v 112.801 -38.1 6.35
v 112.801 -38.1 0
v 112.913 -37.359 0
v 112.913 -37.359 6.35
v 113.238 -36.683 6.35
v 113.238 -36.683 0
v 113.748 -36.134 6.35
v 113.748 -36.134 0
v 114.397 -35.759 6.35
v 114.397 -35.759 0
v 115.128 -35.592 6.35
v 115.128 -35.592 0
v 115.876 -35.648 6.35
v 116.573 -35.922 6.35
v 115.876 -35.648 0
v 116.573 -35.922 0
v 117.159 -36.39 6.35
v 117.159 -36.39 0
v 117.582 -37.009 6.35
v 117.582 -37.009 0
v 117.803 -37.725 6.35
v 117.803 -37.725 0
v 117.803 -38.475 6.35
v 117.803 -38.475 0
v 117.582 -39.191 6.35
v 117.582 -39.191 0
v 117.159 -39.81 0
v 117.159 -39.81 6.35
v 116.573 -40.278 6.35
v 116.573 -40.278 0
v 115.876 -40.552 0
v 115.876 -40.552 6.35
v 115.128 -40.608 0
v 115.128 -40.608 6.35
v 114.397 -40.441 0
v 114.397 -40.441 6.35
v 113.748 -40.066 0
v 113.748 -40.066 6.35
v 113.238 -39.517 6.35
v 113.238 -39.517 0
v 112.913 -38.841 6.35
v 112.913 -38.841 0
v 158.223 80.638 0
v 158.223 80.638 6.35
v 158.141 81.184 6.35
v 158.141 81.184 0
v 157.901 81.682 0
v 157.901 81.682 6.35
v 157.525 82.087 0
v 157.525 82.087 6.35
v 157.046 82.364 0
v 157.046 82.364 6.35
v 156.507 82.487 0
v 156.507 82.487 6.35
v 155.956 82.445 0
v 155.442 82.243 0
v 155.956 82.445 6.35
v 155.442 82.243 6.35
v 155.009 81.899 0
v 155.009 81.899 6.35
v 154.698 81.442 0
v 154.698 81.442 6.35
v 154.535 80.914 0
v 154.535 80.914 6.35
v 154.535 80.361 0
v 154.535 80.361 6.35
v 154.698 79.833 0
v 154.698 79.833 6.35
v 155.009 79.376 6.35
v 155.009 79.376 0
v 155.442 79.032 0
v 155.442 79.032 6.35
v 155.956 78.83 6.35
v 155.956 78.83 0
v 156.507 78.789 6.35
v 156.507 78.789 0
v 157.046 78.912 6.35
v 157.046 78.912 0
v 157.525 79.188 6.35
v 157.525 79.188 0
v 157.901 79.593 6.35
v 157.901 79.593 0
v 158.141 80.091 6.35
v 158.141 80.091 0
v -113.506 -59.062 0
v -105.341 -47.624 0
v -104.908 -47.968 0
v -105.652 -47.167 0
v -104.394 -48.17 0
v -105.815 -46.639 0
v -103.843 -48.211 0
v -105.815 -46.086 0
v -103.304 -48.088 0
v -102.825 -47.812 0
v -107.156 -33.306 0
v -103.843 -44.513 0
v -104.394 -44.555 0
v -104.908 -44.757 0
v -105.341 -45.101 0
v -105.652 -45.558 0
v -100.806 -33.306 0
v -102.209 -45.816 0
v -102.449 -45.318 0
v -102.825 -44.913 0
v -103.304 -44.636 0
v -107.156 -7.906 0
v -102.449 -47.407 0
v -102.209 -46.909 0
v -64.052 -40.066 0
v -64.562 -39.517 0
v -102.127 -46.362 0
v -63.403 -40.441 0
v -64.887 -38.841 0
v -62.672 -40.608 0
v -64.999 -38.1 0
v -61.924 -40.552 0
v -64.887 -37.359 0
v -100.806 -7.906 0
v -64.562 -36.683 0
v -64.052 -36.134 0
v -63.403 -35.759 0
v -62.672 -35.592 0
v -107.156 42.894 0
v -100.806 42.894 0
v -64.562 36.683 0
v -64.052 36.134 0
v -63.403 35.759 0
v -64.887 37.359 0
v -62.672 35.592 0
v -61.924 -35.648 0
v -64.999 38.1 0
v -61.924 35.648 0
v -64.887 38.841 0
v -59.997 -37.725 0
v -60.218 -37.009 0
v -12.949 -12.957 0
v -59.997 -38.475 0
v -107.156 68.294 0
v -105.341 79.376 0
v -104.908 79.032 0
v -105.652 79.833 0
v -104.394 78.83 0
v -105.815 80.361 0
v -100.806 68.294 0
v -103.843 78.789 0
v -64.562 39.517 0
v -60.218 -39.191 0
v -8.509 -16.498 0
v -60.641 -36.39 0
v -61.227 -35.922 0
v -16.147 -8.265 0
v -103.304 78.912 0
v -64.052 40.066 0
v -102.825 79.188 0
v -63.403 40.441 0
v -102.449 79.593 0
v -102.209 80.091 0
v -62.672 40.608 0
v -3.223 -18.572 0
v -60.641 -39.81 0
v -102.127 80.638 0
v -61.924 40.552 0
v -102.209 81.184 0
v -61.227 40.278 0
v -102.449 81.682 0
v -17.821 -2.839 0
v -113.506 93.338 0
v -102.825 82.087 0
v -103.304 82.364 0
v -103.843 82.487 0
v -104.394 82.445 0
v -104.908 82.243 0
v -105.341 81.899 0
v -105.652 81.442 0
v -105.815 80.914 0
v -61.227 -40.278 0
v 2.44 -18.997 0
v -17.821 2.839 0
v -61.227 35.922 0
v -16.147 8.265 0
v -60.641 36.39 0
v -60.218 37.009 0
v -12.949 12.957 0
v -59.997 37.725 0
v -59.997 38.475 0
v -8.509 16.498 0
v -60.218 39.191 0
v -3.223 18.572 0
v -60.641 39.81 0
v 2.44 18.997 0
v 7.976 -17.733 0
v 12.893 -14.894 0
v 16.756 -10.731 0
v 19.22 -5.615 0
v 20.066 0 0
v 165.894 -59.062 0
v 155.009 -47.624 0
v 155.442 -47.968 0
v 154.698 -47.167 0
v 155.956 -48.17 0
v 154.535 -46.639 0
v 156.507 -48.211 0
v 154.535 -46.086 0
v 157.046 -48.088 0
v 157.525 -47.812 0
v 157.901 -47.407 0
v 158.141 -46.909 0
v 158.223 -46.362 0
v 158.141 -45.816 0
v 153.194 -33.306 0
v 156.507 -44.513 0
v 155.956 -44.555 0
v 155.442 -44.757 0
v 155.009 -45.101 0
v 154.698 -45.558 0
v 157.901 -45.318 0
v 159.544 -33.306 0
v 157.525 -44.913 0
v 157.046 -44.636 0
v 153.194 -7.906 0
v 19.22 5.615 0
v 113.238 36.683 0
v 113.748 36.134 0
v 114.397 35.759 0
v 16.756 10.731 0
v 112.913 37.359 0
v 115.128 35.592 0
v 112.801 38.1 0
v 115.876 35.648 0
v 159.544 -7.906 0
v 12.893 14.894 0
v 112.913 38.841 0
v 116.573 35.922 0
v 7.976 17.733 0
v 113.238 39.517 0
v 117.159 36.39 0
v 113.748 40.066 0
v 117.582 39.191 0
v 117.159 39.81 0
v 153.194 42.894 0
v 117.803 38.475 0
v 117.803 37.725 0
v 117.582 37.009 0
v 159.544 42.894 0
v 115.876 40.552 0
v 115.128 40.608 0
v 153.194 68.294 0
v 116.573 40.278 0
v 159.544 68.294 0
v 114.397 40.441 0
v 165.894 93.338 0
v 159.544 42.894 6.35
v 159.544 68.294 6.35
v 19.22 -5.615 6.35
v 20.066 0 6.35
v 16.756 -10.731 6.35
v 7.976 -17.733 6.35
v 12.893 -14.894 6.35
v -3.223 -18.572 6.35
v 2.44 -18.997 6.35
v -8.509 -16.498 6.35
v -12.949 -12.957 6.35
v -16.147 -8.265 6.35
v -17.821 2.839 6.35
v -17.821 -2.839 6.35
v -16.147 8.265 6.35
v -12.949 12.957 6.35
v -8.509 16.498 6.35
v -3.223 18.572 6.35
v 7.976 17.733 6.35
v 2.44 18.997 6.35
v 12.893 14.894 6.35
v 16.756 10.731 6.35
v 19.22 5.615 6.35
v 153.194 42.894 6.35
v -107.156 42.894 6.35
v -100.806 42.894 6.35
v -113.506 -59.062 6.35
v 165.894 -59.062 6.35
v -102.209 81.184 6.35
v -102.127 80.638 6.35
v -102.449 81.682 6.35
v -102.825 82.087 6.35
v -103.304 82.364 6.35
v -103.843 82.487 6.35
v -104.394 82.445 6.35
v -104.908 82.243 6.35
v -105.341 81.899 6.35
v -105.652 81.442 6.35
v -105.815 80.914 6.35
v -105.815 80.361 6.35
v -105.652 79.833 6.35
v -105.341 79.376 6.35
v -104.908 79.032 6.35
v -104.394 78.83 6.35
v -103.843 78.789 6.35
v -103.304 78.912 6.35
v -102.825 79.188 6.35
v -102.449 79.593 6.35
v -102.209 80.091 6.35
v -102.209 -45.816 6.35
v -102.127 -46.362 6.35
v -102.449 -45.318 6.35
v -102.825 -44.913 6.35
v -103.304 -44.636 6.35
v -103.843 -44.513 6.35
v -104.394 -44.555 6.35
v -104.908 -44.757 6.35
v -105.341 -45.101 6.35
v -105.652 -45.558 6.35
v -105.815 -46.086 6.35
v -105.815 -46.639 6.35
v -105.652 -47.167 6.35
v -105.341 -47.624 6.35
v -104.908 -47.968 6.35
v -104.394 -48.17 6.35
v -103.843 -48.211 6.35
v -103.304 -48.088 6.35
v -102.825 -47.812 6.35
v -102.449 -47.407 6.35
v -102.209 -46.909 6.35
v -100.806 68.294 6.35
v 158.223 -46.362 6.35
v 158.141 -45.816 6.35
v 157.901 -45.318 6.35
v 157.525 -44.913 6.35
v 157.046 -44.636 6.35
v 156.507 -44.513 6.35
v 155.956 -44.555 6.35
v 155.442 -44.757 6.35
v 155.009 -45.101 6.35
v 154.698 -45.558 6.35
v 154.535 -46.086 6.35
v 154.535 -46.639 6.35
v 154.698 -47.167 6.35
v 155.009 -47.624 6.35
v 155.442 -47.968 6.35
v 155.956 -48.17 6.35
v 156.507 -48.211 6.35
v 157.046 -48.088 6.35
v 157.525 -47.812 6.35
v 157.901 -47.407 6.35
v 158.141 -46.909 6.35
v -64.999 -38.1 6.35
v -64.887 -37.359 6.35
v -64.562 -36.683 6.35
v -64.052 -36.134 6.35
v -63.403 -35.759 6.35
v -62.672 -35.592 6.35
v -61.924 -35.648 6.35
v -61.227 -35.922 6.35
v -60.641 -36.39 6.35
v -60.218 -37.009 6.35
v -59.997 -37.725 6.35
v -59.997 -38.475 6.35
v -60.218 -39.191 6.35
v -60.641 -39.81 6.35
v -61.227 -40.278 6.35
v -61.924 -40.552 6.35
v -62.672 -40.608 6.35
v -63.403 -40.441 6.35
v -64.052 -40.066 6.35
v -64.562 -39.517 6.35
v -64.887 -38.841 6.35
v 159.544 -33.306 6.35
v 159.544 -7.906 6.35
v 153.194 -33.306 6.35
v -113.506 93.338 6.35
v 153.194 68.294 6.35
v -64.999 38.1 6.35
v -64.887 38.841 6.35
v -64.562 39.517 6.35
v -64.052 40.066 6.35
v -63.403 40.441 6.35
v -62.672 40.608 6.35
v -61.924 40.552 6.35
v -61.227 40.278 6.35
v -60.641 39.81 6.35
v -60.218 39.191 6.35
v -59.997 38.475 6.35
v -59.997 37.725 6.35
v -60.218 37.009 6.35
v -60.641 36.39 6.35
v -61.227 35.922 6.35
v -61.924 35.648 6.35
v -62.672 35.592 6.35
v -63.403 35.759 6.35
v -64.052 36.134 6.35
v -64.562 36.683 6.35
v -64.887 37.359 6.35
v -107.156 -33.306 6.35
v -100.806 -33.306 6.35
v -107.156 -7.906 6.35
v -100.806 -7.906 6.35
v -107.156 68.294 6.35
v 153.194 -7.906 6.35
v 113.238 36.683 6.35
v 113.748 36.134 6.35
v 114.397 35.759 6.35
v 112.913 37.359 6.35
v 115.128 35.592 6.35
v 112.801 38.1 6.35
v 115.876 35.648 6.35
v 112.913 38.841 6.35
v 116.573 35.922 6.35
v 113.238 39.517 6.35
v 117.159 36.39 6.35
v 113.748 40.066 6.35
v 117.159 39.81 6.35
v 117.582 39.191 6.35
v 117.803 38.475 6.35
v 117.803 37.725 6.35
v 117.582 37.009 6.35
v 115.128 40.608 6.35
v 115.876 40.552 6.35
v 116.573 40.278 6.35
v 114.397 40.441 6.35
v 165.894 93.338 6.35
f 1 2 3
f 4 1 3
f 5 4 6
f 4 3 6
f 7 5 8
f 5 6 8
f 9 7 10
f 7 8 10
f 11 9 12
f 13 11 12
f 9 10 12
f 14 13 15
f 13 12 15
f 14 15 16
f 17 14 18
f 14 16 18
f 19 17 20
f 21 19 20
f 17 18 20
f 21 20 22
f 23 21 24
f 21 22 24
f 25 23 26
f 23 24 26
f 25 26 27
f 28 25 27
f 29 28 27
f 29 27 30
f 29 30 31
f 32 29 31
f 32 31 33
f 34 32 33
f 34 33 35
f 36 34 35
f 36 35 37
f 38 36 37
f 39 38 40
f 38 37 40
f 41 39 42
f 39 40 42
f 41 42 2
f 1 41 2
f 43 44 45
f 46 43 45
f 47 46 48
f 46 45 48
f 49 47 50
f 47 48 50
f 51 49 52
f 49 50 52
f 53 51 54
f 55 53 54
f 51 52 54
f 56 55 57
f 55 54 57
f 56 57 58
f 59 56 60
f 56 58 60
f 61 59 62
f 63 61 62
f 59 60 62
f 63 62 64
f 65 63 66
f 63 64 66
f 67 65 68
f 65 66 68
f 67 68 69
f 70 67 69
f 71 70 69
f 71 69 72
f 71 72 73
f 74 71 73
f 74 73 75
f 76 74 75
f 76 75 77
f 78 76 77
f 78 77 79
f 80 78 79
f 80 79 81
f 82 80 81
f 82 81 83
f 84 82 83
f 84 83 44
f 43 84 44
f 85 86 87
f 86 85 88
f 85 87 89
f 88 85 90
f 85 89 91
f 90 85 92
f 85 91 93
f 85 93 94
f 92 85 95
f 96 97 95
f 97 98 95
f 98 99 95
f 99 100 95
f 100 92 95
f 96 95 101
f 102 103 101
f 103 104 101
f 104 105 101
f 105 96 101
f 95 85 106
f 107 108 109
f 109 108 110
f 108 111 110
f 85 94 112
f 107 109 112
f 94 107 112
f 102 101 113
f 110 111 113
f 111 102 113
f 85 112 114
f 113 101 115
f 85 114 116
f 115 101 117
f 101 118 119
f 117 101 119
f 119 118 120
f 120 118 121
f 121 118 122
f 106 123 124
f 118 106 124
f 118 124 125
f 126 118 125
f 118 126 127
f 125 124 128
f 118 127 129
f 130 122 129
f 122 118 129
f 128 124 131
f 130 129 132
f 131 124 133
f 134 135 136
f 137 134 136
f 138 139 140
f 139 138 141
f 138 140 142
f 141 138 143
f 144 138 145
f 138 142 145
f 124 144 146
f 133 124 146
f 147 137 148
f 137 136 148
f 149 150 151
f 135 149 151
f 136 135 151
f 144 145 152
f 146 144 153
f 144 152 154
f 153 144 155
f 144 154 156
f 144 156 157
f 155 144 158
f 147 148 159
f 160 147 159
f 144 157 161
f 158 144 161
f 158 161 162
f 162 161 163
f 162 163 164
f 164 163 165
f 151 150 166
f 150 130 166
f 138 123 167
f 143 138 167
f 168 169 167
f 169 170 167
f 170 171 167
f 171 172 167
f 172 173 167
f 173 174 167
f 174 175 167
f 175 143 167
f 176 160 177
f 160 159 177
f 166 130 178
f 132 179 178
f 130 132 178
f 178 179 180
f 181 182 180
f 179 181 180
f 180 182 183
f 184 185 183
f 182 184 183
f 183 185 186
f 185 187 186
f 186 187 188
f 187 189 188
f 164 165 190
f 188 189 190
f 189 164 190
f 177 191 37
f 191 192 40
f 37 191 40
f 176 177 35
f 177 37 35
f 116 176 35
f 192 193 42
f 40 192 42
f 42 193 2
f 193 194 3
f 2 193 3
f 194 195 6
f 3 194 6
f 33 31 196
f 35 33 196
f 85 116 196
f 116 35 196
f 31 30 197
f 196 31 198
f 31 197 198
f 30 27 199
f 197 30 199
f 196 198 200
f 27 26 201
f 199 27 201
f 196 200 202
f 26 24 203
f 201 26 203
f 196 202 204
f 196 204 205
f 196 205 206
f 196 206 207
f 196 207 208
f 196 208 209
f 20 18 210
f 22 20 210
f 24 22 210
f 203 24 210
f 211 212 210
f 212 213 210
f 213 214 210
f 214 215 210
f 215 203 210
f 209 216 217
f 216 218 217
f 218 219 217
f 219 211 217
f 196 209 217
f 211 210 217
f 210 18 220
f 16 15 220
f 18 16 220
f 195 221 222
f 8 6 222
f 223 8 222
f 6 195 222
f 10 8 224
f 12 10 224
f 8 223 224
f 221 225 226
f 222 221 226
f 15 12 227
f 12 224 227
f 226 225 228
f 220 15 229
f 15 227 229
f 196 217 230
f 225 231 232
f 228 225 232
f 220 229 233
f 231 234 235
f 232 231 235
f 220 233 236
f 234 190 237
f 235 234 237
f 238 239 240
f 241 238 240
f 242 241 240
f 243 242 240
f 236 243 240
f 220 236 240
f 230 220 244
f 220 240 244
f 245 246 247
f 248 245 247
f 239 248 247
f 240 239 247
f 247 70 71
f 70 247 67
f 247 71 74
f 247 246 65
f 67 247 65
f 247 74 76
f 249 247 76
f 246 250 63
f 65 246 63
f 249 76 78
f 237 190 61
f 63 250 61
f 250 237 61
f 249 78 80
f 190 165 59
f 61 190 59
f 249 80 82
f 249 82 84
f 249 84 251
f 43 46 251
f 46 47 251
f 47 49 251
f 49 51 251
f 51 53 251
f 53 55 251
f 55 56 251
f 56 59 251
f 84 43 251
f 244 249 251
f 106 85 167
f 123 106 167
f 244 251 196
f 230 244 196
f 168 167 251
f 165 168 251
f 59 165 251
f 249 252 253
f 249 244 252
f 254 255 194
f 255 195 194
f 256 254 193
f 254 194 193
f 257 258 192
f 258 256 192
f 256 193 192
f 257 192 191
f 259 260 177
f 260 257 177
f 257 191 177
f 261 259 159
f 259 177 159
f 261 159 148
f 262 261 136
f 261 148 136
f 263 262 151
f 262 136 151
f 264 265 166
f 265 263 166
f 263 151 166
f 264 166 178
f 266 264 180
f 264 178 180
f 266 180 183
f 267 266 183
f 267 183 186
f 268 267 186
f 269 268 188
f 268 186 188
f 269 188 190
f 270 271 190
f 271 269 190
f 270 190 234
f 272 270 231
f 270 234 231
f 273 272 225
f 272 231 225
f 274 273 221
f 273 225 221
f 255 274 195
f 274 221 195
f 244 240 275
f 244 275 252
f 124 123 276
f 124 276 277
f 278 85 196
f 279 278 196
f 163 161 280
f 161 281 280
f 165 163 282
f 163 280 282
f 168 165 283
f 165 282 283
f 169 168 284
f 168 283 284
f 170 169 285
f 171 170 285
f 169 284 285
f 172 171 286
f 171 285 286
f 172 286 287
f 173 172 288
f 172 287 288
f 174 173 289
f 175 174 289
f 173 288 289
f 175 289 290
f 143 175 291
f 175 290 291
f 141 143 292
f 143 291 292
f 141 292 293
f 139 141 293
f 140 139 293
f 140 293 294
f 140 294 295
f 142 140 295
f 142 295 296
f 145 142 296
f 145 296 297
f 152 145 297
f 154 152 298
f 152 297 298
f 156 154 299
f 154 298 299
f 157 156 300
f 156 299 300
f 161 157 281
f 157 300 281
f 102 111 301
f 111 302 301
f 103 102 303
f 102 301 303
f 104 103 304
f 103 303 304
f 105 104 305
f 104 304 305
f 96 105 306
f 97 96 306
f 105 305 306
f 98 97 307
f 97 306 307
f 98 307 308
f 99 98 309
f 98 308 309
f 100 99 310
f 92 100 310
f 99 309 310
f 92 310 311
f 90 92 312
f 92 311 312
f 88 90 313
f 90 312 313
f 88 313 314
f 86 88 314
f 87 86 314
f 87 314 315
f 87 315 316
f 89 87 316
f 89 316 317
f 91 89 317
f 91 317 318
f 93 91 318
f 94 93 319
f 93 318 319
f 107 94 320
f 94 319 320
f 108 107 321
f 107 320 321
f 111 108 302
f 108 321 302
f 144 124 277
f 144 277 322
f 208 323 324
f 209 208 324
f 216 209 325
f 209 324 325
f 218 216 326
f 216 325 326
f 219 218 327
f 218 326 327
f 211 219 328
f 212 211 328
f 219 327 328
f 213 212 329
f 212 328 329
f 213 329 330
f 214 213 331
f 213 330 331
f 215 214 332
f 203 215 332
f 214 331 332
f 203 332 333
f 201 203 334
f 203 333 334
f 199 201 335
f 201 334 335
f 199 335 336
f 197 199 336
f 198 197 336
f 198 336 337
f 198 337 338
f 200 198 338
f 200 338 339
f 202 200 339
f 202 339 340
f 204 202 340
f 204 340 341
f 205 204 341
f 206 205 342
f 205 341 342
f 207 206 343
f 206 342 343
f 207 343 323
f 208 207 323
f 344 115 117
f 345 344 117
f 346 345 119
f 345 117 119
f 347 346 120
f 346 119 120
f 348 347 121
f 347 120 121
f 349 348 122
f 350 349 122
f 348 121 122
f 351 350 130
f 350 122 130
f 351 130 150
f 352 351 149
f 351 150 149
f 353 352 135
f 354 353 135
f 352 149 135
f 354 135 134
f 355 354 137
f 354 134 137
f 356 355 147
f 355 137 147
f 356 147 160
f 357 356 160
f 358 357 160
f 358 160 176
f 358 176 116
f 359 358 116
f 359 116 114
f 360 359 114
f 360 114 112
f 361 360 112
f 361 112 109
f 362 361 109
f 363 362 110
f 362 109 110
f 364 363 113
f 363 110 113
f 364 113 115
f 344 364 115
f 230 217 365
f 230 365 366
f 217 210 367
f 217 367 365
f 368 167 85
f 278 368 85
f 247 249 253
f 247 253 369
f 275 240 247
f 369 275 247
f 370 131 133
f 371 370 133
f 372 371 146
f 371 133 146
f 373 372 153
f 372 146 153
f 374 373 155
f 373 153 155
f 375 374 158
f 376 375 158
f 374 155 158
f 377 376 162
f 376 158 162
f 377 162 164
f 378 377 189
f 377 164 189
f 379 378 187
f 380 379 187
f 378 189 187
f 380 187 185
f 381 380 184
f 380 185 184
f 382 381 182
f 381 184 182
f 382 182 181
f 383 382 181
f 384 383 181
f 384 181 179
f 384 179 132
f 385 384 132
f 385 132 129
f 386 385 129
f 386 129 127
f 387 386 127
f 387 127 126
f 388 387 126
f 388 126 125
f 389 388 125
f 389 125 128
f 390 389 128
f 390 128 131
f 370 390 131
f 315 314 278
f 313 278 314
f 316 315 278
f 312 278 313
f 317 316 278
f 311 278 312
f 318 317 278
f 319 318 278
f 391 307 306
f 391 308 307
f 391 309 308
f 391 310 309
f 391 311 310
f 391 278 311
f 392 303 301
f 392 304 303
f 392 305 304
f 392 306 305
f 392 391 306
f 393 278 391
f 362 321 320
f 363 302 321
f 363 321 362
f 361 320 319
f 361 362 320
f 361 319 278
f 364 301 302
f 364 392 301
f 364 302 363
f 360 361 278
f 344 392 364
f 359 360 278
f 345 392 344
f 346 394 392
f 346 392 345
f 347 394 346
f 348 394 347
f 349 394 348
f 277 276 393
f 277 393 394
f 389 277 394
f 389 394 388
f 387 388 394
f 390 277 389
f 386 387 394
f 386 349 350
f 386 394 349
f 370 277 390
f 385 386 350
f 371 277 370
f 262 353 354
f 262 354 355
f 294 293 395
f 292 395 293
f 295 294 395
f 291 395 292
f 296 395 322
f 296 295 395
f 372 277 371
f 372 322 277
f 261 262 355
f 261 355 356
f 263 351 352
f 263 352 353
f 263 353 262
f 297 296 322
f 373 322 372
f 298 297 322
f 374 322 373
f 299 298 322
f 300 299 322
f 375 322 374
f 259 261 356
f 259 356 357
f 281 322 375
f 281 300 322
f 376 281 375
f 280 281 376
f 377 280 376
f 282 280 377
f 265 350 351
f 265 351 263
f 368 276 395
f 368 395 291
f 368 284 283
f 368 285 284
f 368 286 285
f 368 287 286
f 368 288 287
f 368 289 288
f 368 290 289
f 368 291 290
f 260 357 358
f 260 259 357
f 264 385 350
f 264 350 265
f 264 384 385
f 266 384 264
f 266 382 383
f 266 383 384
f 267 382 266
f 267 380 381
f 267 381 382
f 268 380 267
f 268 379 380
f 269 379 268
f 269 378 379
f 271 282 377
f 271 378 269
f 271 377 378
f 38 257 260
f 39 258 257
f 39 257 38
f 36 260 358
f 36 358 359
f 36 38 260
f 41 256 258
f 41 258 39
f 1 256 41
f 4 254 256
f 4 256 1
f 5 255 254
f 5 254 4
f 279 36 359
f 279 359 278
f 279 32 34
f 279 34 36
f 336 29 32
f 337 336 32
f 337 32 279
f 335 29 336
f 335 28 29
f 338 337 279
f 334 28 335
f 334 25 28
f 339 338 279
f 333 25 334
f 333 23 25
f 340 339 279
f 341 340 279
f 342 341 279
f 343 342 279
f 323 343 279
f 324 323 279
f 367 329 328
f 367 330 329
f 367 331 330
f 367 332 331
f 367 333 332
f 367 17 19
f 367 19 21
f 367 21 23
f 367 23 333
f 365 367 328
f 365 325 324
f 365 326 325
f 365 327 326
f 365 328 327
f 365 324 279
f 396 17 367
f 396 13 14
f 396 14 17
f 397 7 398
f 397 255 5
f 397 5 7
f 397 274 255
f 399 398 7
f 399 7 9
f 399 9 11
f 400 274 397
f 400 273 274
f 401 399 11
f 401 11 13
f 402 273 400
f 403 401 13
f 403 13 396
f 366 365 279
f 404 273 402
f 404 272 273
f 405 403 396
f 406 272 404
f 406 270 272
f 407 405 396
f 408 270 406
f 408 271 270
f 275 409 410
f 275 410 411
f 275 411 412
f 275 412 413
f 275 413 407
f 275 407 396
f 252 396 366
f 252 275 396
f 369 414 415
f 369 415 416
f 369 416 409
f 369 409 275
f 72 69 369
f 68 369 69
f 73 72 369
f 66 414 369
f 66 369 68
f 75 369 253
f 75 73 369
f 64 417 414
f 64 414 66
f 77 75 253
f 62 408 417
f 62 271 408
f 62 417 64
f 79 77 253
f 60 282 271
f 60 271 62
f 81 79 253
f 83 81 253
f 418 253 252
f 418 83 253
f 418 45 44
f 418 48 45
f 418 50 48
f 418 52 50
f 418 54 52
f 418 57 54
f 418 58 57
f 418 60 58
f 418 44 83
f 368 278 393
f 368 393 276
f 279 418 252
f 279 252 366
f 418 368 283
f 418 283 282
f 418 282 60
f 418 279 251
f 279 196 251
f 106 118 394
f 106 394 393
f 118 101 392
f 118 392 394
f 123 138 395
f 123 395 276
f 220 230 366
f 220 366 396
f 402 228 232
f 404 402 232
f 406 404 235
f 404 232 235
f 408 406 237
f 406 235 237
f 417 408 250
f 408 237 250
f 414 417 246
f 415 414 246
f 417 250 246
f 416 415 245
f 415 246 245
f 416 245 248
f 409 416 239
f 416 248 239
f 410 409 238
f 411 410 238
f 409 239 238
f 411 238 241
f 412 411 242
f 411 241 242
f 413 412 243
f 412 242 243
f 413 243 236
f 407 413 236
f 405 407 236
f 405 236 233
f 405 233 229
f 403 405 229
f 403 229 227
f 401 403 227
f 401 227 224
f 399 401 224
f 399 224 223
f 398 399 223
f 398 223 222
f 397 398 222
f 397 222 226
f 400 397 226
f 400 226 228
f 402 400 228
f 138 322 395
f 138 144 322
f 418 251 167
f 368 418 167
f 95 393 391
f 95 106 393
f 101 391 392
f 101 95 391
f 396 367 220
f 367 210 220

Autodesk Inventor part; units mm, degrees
ref_plane "YZ Plane" through (0, 0, 0) normal (1, 0, 0) x (0, 1, 0)
ref_plane "XZ Plane" through (0, 0, 0) normal (0, 1, 0) x (-1, 0, 0)
ref_plane "XY Plane" through (0, 0, 0) normal (0, 0, 1) x (1, 0, 0)
sketch "Sketch1" plane through (0, 0, 0) normal (0, 0, 1) x (1, 0, 0)
  circle A0 centre (1.016, 0) radius 19.05
  line L0 (159.5437, -28.575) -> (159.5437, 29.0493) projected
  line L1 (145.8277, 86.9876) -> (-55.3403, 86.9876) projected
  line L2 (159.5437, 93.3376) -> (-107.1563, 93.3376)
  line L3 (-107.1563, 93.3376) -> (-107.1563, -59.0624)
  line L4 (-107.1563, -59.0624) -> (159.5437, -59.0624)
  line L5 (159.5437, -59.0624) -> (159.5437, 93.3376)
  point P0 (0, 0)
  dimension "d0" = 266.7
  dimension "d1" = 152.4
  dimension "d15" = 38.1
extrude "Extrusion1" add sketch "Sketch1" along normal blind 6.35
sketch "Sketch2" plane through (0, 0, 6.35) normal (0, 0, 1) x (1, 0, 0)
  line L0 (-107.1563, 93.3376) -> (159.5437, 93.3376) projected
  line L1 (-107.1563, -59.0624) -> (-107.1563, 93.3376) projected
  line L2 (-103.9813, 93.3376) -> (-103.9813, -59.0624) construction
  circle A0 centre (-103.9813, 80.6376) radius 1.8542
  dimension "d4" = 3.175
  dimension "d5" = 3.7084
  dimension "d6" = 12.7
extrude "Extrusion2" cut sketch "Sketch2" against normal through all
pattern_linear "Rectangular Pattern1" count 2 spacing 127 along (0, -1, 0) count 2 spacing 260.35 along (1, 0, 0) of "Extrusion2"
sketch "Sketch3" plane through (0, 0, 0) normal (0, 0, -1) x (-1, 0, 0)
  circle A0 centre (62.484, 38.1) radius 2.5146 projected
  circle A1 centre (62.484, -38.1) radius 2.5146 projected
  circle A2 centre (-115.316, -38.1) radius 2.5146 projected
  circle A3 centre (-115.316, 38.1) radius 2.5146 projected
  point P0 (0, 0)
extrude "Extrusion3" cut sketch "Sketch3" against normal through all
sketch "Sketch4" plane through (0, 0, 0) normal (0, 0, -1) x (-1, 0, 0)
  line L0 (107.1563, 93.3376) -> (113.5063, 93.3376)
  line L1 (113.5063, 93.3376) -> (113.5063, -59.0624)
  line L2 (113.5063, -59.0624) -> (107.1563, -59.0624)
  line L3 (107.1563, -59.0624) -> (107.1563, 93.3376)
  line L4 (-159.5437, -59.0624) -> (-165.8937, -59.0624)
  line L5 (-165.8937, -59.0624) -> (-165.8937, 93.3376)
  line L6 (-165.8937, 93.3376) -> (-159.5437, 93.3376)
  line L7 (-159.5437, 93.3376) -> (-159.5437, -59.0624)
  point P0 (0, 0)
  dimension "d18" = 6.35
  dimension "d19" = 6.35
extrude "Extrusion4" add sketch "Sketch4" against normal blind 6.35
sketch "Sketch5" plane through (0, 0, 0) normal (0, 0, -1) x (-1, 0, 0)
  line L0 (-159.5437, -59.0624) -> (-159.5437, 93.3376) projected
  line L1 (-159.5437, 93.3376) -> (-153.1937, 93.3376) projected
  line L2 (-153.1937, -59.0624) -> (-153.1937, 93.3376) projected
  line L3 (-159.5437, -59.0624) -> (-153.1937, -59.0624) projected
  line L4 (-159.5437, 68.2942) -> (-153.1937, 68.2942)
  line L5 (-153.1937, 68.2942) -> (-153.1937, 42.8942)
  line L6 (-153.1937, 42.8942) -> (-159.5437, 42.8942)
  line L7 (-159.5437, 42.8942) -> (-159.5437, 68.2942)
  line L8 (-159.5437, -7.9058) -> (-153.1937, -7.9058)
  line L9 (-153.1937, -7.9058) -> (-153.1937, -33.3058)
  line L10 (-153.1937, -33.3058) -> (-159.5437, -33.3058)
  line L11 (-159.5437, -33.3058) -> (-159.5437, -7.9058)
  line L12 (100.8063, 68.2942) -> (107.1563, 68.2942)
  line L13 (107.1563, 68.2942) -> (107.1563, 42.8942)
  line L14 (107.1563, 42.8942) -> (100.8063, 42.8942)
  line L15 (100.8063, 42.8942) -> (100.8063, 68.2942)
  line L16 (100.8063, -7.9058) -> (107.1563, -7.9058)
  line L17 (107.1563, -7.9058) -> (107.1563, -33.3058)
  line L18 (107.1563, -33.3058) -> (100.8063, -33.3058)
  line L19 (100.8063, -33.3058) -> (100.8063, -7.9058)
  point P0 (0, 0)
  dimension "d22" = 25.4
  dimension "d25" = 76.2
  dimension "d28" = 260.35
extrude "Extrusion5" cut sketch "Sketch5" against normal through all contours L0 L8 L2 L10 | L0 L4 L2 L6 | L12 L13 L14 L15 | L16 L17 L18 L19
properties part number "panStepperMountRB01" material "Wood (Oak)"
